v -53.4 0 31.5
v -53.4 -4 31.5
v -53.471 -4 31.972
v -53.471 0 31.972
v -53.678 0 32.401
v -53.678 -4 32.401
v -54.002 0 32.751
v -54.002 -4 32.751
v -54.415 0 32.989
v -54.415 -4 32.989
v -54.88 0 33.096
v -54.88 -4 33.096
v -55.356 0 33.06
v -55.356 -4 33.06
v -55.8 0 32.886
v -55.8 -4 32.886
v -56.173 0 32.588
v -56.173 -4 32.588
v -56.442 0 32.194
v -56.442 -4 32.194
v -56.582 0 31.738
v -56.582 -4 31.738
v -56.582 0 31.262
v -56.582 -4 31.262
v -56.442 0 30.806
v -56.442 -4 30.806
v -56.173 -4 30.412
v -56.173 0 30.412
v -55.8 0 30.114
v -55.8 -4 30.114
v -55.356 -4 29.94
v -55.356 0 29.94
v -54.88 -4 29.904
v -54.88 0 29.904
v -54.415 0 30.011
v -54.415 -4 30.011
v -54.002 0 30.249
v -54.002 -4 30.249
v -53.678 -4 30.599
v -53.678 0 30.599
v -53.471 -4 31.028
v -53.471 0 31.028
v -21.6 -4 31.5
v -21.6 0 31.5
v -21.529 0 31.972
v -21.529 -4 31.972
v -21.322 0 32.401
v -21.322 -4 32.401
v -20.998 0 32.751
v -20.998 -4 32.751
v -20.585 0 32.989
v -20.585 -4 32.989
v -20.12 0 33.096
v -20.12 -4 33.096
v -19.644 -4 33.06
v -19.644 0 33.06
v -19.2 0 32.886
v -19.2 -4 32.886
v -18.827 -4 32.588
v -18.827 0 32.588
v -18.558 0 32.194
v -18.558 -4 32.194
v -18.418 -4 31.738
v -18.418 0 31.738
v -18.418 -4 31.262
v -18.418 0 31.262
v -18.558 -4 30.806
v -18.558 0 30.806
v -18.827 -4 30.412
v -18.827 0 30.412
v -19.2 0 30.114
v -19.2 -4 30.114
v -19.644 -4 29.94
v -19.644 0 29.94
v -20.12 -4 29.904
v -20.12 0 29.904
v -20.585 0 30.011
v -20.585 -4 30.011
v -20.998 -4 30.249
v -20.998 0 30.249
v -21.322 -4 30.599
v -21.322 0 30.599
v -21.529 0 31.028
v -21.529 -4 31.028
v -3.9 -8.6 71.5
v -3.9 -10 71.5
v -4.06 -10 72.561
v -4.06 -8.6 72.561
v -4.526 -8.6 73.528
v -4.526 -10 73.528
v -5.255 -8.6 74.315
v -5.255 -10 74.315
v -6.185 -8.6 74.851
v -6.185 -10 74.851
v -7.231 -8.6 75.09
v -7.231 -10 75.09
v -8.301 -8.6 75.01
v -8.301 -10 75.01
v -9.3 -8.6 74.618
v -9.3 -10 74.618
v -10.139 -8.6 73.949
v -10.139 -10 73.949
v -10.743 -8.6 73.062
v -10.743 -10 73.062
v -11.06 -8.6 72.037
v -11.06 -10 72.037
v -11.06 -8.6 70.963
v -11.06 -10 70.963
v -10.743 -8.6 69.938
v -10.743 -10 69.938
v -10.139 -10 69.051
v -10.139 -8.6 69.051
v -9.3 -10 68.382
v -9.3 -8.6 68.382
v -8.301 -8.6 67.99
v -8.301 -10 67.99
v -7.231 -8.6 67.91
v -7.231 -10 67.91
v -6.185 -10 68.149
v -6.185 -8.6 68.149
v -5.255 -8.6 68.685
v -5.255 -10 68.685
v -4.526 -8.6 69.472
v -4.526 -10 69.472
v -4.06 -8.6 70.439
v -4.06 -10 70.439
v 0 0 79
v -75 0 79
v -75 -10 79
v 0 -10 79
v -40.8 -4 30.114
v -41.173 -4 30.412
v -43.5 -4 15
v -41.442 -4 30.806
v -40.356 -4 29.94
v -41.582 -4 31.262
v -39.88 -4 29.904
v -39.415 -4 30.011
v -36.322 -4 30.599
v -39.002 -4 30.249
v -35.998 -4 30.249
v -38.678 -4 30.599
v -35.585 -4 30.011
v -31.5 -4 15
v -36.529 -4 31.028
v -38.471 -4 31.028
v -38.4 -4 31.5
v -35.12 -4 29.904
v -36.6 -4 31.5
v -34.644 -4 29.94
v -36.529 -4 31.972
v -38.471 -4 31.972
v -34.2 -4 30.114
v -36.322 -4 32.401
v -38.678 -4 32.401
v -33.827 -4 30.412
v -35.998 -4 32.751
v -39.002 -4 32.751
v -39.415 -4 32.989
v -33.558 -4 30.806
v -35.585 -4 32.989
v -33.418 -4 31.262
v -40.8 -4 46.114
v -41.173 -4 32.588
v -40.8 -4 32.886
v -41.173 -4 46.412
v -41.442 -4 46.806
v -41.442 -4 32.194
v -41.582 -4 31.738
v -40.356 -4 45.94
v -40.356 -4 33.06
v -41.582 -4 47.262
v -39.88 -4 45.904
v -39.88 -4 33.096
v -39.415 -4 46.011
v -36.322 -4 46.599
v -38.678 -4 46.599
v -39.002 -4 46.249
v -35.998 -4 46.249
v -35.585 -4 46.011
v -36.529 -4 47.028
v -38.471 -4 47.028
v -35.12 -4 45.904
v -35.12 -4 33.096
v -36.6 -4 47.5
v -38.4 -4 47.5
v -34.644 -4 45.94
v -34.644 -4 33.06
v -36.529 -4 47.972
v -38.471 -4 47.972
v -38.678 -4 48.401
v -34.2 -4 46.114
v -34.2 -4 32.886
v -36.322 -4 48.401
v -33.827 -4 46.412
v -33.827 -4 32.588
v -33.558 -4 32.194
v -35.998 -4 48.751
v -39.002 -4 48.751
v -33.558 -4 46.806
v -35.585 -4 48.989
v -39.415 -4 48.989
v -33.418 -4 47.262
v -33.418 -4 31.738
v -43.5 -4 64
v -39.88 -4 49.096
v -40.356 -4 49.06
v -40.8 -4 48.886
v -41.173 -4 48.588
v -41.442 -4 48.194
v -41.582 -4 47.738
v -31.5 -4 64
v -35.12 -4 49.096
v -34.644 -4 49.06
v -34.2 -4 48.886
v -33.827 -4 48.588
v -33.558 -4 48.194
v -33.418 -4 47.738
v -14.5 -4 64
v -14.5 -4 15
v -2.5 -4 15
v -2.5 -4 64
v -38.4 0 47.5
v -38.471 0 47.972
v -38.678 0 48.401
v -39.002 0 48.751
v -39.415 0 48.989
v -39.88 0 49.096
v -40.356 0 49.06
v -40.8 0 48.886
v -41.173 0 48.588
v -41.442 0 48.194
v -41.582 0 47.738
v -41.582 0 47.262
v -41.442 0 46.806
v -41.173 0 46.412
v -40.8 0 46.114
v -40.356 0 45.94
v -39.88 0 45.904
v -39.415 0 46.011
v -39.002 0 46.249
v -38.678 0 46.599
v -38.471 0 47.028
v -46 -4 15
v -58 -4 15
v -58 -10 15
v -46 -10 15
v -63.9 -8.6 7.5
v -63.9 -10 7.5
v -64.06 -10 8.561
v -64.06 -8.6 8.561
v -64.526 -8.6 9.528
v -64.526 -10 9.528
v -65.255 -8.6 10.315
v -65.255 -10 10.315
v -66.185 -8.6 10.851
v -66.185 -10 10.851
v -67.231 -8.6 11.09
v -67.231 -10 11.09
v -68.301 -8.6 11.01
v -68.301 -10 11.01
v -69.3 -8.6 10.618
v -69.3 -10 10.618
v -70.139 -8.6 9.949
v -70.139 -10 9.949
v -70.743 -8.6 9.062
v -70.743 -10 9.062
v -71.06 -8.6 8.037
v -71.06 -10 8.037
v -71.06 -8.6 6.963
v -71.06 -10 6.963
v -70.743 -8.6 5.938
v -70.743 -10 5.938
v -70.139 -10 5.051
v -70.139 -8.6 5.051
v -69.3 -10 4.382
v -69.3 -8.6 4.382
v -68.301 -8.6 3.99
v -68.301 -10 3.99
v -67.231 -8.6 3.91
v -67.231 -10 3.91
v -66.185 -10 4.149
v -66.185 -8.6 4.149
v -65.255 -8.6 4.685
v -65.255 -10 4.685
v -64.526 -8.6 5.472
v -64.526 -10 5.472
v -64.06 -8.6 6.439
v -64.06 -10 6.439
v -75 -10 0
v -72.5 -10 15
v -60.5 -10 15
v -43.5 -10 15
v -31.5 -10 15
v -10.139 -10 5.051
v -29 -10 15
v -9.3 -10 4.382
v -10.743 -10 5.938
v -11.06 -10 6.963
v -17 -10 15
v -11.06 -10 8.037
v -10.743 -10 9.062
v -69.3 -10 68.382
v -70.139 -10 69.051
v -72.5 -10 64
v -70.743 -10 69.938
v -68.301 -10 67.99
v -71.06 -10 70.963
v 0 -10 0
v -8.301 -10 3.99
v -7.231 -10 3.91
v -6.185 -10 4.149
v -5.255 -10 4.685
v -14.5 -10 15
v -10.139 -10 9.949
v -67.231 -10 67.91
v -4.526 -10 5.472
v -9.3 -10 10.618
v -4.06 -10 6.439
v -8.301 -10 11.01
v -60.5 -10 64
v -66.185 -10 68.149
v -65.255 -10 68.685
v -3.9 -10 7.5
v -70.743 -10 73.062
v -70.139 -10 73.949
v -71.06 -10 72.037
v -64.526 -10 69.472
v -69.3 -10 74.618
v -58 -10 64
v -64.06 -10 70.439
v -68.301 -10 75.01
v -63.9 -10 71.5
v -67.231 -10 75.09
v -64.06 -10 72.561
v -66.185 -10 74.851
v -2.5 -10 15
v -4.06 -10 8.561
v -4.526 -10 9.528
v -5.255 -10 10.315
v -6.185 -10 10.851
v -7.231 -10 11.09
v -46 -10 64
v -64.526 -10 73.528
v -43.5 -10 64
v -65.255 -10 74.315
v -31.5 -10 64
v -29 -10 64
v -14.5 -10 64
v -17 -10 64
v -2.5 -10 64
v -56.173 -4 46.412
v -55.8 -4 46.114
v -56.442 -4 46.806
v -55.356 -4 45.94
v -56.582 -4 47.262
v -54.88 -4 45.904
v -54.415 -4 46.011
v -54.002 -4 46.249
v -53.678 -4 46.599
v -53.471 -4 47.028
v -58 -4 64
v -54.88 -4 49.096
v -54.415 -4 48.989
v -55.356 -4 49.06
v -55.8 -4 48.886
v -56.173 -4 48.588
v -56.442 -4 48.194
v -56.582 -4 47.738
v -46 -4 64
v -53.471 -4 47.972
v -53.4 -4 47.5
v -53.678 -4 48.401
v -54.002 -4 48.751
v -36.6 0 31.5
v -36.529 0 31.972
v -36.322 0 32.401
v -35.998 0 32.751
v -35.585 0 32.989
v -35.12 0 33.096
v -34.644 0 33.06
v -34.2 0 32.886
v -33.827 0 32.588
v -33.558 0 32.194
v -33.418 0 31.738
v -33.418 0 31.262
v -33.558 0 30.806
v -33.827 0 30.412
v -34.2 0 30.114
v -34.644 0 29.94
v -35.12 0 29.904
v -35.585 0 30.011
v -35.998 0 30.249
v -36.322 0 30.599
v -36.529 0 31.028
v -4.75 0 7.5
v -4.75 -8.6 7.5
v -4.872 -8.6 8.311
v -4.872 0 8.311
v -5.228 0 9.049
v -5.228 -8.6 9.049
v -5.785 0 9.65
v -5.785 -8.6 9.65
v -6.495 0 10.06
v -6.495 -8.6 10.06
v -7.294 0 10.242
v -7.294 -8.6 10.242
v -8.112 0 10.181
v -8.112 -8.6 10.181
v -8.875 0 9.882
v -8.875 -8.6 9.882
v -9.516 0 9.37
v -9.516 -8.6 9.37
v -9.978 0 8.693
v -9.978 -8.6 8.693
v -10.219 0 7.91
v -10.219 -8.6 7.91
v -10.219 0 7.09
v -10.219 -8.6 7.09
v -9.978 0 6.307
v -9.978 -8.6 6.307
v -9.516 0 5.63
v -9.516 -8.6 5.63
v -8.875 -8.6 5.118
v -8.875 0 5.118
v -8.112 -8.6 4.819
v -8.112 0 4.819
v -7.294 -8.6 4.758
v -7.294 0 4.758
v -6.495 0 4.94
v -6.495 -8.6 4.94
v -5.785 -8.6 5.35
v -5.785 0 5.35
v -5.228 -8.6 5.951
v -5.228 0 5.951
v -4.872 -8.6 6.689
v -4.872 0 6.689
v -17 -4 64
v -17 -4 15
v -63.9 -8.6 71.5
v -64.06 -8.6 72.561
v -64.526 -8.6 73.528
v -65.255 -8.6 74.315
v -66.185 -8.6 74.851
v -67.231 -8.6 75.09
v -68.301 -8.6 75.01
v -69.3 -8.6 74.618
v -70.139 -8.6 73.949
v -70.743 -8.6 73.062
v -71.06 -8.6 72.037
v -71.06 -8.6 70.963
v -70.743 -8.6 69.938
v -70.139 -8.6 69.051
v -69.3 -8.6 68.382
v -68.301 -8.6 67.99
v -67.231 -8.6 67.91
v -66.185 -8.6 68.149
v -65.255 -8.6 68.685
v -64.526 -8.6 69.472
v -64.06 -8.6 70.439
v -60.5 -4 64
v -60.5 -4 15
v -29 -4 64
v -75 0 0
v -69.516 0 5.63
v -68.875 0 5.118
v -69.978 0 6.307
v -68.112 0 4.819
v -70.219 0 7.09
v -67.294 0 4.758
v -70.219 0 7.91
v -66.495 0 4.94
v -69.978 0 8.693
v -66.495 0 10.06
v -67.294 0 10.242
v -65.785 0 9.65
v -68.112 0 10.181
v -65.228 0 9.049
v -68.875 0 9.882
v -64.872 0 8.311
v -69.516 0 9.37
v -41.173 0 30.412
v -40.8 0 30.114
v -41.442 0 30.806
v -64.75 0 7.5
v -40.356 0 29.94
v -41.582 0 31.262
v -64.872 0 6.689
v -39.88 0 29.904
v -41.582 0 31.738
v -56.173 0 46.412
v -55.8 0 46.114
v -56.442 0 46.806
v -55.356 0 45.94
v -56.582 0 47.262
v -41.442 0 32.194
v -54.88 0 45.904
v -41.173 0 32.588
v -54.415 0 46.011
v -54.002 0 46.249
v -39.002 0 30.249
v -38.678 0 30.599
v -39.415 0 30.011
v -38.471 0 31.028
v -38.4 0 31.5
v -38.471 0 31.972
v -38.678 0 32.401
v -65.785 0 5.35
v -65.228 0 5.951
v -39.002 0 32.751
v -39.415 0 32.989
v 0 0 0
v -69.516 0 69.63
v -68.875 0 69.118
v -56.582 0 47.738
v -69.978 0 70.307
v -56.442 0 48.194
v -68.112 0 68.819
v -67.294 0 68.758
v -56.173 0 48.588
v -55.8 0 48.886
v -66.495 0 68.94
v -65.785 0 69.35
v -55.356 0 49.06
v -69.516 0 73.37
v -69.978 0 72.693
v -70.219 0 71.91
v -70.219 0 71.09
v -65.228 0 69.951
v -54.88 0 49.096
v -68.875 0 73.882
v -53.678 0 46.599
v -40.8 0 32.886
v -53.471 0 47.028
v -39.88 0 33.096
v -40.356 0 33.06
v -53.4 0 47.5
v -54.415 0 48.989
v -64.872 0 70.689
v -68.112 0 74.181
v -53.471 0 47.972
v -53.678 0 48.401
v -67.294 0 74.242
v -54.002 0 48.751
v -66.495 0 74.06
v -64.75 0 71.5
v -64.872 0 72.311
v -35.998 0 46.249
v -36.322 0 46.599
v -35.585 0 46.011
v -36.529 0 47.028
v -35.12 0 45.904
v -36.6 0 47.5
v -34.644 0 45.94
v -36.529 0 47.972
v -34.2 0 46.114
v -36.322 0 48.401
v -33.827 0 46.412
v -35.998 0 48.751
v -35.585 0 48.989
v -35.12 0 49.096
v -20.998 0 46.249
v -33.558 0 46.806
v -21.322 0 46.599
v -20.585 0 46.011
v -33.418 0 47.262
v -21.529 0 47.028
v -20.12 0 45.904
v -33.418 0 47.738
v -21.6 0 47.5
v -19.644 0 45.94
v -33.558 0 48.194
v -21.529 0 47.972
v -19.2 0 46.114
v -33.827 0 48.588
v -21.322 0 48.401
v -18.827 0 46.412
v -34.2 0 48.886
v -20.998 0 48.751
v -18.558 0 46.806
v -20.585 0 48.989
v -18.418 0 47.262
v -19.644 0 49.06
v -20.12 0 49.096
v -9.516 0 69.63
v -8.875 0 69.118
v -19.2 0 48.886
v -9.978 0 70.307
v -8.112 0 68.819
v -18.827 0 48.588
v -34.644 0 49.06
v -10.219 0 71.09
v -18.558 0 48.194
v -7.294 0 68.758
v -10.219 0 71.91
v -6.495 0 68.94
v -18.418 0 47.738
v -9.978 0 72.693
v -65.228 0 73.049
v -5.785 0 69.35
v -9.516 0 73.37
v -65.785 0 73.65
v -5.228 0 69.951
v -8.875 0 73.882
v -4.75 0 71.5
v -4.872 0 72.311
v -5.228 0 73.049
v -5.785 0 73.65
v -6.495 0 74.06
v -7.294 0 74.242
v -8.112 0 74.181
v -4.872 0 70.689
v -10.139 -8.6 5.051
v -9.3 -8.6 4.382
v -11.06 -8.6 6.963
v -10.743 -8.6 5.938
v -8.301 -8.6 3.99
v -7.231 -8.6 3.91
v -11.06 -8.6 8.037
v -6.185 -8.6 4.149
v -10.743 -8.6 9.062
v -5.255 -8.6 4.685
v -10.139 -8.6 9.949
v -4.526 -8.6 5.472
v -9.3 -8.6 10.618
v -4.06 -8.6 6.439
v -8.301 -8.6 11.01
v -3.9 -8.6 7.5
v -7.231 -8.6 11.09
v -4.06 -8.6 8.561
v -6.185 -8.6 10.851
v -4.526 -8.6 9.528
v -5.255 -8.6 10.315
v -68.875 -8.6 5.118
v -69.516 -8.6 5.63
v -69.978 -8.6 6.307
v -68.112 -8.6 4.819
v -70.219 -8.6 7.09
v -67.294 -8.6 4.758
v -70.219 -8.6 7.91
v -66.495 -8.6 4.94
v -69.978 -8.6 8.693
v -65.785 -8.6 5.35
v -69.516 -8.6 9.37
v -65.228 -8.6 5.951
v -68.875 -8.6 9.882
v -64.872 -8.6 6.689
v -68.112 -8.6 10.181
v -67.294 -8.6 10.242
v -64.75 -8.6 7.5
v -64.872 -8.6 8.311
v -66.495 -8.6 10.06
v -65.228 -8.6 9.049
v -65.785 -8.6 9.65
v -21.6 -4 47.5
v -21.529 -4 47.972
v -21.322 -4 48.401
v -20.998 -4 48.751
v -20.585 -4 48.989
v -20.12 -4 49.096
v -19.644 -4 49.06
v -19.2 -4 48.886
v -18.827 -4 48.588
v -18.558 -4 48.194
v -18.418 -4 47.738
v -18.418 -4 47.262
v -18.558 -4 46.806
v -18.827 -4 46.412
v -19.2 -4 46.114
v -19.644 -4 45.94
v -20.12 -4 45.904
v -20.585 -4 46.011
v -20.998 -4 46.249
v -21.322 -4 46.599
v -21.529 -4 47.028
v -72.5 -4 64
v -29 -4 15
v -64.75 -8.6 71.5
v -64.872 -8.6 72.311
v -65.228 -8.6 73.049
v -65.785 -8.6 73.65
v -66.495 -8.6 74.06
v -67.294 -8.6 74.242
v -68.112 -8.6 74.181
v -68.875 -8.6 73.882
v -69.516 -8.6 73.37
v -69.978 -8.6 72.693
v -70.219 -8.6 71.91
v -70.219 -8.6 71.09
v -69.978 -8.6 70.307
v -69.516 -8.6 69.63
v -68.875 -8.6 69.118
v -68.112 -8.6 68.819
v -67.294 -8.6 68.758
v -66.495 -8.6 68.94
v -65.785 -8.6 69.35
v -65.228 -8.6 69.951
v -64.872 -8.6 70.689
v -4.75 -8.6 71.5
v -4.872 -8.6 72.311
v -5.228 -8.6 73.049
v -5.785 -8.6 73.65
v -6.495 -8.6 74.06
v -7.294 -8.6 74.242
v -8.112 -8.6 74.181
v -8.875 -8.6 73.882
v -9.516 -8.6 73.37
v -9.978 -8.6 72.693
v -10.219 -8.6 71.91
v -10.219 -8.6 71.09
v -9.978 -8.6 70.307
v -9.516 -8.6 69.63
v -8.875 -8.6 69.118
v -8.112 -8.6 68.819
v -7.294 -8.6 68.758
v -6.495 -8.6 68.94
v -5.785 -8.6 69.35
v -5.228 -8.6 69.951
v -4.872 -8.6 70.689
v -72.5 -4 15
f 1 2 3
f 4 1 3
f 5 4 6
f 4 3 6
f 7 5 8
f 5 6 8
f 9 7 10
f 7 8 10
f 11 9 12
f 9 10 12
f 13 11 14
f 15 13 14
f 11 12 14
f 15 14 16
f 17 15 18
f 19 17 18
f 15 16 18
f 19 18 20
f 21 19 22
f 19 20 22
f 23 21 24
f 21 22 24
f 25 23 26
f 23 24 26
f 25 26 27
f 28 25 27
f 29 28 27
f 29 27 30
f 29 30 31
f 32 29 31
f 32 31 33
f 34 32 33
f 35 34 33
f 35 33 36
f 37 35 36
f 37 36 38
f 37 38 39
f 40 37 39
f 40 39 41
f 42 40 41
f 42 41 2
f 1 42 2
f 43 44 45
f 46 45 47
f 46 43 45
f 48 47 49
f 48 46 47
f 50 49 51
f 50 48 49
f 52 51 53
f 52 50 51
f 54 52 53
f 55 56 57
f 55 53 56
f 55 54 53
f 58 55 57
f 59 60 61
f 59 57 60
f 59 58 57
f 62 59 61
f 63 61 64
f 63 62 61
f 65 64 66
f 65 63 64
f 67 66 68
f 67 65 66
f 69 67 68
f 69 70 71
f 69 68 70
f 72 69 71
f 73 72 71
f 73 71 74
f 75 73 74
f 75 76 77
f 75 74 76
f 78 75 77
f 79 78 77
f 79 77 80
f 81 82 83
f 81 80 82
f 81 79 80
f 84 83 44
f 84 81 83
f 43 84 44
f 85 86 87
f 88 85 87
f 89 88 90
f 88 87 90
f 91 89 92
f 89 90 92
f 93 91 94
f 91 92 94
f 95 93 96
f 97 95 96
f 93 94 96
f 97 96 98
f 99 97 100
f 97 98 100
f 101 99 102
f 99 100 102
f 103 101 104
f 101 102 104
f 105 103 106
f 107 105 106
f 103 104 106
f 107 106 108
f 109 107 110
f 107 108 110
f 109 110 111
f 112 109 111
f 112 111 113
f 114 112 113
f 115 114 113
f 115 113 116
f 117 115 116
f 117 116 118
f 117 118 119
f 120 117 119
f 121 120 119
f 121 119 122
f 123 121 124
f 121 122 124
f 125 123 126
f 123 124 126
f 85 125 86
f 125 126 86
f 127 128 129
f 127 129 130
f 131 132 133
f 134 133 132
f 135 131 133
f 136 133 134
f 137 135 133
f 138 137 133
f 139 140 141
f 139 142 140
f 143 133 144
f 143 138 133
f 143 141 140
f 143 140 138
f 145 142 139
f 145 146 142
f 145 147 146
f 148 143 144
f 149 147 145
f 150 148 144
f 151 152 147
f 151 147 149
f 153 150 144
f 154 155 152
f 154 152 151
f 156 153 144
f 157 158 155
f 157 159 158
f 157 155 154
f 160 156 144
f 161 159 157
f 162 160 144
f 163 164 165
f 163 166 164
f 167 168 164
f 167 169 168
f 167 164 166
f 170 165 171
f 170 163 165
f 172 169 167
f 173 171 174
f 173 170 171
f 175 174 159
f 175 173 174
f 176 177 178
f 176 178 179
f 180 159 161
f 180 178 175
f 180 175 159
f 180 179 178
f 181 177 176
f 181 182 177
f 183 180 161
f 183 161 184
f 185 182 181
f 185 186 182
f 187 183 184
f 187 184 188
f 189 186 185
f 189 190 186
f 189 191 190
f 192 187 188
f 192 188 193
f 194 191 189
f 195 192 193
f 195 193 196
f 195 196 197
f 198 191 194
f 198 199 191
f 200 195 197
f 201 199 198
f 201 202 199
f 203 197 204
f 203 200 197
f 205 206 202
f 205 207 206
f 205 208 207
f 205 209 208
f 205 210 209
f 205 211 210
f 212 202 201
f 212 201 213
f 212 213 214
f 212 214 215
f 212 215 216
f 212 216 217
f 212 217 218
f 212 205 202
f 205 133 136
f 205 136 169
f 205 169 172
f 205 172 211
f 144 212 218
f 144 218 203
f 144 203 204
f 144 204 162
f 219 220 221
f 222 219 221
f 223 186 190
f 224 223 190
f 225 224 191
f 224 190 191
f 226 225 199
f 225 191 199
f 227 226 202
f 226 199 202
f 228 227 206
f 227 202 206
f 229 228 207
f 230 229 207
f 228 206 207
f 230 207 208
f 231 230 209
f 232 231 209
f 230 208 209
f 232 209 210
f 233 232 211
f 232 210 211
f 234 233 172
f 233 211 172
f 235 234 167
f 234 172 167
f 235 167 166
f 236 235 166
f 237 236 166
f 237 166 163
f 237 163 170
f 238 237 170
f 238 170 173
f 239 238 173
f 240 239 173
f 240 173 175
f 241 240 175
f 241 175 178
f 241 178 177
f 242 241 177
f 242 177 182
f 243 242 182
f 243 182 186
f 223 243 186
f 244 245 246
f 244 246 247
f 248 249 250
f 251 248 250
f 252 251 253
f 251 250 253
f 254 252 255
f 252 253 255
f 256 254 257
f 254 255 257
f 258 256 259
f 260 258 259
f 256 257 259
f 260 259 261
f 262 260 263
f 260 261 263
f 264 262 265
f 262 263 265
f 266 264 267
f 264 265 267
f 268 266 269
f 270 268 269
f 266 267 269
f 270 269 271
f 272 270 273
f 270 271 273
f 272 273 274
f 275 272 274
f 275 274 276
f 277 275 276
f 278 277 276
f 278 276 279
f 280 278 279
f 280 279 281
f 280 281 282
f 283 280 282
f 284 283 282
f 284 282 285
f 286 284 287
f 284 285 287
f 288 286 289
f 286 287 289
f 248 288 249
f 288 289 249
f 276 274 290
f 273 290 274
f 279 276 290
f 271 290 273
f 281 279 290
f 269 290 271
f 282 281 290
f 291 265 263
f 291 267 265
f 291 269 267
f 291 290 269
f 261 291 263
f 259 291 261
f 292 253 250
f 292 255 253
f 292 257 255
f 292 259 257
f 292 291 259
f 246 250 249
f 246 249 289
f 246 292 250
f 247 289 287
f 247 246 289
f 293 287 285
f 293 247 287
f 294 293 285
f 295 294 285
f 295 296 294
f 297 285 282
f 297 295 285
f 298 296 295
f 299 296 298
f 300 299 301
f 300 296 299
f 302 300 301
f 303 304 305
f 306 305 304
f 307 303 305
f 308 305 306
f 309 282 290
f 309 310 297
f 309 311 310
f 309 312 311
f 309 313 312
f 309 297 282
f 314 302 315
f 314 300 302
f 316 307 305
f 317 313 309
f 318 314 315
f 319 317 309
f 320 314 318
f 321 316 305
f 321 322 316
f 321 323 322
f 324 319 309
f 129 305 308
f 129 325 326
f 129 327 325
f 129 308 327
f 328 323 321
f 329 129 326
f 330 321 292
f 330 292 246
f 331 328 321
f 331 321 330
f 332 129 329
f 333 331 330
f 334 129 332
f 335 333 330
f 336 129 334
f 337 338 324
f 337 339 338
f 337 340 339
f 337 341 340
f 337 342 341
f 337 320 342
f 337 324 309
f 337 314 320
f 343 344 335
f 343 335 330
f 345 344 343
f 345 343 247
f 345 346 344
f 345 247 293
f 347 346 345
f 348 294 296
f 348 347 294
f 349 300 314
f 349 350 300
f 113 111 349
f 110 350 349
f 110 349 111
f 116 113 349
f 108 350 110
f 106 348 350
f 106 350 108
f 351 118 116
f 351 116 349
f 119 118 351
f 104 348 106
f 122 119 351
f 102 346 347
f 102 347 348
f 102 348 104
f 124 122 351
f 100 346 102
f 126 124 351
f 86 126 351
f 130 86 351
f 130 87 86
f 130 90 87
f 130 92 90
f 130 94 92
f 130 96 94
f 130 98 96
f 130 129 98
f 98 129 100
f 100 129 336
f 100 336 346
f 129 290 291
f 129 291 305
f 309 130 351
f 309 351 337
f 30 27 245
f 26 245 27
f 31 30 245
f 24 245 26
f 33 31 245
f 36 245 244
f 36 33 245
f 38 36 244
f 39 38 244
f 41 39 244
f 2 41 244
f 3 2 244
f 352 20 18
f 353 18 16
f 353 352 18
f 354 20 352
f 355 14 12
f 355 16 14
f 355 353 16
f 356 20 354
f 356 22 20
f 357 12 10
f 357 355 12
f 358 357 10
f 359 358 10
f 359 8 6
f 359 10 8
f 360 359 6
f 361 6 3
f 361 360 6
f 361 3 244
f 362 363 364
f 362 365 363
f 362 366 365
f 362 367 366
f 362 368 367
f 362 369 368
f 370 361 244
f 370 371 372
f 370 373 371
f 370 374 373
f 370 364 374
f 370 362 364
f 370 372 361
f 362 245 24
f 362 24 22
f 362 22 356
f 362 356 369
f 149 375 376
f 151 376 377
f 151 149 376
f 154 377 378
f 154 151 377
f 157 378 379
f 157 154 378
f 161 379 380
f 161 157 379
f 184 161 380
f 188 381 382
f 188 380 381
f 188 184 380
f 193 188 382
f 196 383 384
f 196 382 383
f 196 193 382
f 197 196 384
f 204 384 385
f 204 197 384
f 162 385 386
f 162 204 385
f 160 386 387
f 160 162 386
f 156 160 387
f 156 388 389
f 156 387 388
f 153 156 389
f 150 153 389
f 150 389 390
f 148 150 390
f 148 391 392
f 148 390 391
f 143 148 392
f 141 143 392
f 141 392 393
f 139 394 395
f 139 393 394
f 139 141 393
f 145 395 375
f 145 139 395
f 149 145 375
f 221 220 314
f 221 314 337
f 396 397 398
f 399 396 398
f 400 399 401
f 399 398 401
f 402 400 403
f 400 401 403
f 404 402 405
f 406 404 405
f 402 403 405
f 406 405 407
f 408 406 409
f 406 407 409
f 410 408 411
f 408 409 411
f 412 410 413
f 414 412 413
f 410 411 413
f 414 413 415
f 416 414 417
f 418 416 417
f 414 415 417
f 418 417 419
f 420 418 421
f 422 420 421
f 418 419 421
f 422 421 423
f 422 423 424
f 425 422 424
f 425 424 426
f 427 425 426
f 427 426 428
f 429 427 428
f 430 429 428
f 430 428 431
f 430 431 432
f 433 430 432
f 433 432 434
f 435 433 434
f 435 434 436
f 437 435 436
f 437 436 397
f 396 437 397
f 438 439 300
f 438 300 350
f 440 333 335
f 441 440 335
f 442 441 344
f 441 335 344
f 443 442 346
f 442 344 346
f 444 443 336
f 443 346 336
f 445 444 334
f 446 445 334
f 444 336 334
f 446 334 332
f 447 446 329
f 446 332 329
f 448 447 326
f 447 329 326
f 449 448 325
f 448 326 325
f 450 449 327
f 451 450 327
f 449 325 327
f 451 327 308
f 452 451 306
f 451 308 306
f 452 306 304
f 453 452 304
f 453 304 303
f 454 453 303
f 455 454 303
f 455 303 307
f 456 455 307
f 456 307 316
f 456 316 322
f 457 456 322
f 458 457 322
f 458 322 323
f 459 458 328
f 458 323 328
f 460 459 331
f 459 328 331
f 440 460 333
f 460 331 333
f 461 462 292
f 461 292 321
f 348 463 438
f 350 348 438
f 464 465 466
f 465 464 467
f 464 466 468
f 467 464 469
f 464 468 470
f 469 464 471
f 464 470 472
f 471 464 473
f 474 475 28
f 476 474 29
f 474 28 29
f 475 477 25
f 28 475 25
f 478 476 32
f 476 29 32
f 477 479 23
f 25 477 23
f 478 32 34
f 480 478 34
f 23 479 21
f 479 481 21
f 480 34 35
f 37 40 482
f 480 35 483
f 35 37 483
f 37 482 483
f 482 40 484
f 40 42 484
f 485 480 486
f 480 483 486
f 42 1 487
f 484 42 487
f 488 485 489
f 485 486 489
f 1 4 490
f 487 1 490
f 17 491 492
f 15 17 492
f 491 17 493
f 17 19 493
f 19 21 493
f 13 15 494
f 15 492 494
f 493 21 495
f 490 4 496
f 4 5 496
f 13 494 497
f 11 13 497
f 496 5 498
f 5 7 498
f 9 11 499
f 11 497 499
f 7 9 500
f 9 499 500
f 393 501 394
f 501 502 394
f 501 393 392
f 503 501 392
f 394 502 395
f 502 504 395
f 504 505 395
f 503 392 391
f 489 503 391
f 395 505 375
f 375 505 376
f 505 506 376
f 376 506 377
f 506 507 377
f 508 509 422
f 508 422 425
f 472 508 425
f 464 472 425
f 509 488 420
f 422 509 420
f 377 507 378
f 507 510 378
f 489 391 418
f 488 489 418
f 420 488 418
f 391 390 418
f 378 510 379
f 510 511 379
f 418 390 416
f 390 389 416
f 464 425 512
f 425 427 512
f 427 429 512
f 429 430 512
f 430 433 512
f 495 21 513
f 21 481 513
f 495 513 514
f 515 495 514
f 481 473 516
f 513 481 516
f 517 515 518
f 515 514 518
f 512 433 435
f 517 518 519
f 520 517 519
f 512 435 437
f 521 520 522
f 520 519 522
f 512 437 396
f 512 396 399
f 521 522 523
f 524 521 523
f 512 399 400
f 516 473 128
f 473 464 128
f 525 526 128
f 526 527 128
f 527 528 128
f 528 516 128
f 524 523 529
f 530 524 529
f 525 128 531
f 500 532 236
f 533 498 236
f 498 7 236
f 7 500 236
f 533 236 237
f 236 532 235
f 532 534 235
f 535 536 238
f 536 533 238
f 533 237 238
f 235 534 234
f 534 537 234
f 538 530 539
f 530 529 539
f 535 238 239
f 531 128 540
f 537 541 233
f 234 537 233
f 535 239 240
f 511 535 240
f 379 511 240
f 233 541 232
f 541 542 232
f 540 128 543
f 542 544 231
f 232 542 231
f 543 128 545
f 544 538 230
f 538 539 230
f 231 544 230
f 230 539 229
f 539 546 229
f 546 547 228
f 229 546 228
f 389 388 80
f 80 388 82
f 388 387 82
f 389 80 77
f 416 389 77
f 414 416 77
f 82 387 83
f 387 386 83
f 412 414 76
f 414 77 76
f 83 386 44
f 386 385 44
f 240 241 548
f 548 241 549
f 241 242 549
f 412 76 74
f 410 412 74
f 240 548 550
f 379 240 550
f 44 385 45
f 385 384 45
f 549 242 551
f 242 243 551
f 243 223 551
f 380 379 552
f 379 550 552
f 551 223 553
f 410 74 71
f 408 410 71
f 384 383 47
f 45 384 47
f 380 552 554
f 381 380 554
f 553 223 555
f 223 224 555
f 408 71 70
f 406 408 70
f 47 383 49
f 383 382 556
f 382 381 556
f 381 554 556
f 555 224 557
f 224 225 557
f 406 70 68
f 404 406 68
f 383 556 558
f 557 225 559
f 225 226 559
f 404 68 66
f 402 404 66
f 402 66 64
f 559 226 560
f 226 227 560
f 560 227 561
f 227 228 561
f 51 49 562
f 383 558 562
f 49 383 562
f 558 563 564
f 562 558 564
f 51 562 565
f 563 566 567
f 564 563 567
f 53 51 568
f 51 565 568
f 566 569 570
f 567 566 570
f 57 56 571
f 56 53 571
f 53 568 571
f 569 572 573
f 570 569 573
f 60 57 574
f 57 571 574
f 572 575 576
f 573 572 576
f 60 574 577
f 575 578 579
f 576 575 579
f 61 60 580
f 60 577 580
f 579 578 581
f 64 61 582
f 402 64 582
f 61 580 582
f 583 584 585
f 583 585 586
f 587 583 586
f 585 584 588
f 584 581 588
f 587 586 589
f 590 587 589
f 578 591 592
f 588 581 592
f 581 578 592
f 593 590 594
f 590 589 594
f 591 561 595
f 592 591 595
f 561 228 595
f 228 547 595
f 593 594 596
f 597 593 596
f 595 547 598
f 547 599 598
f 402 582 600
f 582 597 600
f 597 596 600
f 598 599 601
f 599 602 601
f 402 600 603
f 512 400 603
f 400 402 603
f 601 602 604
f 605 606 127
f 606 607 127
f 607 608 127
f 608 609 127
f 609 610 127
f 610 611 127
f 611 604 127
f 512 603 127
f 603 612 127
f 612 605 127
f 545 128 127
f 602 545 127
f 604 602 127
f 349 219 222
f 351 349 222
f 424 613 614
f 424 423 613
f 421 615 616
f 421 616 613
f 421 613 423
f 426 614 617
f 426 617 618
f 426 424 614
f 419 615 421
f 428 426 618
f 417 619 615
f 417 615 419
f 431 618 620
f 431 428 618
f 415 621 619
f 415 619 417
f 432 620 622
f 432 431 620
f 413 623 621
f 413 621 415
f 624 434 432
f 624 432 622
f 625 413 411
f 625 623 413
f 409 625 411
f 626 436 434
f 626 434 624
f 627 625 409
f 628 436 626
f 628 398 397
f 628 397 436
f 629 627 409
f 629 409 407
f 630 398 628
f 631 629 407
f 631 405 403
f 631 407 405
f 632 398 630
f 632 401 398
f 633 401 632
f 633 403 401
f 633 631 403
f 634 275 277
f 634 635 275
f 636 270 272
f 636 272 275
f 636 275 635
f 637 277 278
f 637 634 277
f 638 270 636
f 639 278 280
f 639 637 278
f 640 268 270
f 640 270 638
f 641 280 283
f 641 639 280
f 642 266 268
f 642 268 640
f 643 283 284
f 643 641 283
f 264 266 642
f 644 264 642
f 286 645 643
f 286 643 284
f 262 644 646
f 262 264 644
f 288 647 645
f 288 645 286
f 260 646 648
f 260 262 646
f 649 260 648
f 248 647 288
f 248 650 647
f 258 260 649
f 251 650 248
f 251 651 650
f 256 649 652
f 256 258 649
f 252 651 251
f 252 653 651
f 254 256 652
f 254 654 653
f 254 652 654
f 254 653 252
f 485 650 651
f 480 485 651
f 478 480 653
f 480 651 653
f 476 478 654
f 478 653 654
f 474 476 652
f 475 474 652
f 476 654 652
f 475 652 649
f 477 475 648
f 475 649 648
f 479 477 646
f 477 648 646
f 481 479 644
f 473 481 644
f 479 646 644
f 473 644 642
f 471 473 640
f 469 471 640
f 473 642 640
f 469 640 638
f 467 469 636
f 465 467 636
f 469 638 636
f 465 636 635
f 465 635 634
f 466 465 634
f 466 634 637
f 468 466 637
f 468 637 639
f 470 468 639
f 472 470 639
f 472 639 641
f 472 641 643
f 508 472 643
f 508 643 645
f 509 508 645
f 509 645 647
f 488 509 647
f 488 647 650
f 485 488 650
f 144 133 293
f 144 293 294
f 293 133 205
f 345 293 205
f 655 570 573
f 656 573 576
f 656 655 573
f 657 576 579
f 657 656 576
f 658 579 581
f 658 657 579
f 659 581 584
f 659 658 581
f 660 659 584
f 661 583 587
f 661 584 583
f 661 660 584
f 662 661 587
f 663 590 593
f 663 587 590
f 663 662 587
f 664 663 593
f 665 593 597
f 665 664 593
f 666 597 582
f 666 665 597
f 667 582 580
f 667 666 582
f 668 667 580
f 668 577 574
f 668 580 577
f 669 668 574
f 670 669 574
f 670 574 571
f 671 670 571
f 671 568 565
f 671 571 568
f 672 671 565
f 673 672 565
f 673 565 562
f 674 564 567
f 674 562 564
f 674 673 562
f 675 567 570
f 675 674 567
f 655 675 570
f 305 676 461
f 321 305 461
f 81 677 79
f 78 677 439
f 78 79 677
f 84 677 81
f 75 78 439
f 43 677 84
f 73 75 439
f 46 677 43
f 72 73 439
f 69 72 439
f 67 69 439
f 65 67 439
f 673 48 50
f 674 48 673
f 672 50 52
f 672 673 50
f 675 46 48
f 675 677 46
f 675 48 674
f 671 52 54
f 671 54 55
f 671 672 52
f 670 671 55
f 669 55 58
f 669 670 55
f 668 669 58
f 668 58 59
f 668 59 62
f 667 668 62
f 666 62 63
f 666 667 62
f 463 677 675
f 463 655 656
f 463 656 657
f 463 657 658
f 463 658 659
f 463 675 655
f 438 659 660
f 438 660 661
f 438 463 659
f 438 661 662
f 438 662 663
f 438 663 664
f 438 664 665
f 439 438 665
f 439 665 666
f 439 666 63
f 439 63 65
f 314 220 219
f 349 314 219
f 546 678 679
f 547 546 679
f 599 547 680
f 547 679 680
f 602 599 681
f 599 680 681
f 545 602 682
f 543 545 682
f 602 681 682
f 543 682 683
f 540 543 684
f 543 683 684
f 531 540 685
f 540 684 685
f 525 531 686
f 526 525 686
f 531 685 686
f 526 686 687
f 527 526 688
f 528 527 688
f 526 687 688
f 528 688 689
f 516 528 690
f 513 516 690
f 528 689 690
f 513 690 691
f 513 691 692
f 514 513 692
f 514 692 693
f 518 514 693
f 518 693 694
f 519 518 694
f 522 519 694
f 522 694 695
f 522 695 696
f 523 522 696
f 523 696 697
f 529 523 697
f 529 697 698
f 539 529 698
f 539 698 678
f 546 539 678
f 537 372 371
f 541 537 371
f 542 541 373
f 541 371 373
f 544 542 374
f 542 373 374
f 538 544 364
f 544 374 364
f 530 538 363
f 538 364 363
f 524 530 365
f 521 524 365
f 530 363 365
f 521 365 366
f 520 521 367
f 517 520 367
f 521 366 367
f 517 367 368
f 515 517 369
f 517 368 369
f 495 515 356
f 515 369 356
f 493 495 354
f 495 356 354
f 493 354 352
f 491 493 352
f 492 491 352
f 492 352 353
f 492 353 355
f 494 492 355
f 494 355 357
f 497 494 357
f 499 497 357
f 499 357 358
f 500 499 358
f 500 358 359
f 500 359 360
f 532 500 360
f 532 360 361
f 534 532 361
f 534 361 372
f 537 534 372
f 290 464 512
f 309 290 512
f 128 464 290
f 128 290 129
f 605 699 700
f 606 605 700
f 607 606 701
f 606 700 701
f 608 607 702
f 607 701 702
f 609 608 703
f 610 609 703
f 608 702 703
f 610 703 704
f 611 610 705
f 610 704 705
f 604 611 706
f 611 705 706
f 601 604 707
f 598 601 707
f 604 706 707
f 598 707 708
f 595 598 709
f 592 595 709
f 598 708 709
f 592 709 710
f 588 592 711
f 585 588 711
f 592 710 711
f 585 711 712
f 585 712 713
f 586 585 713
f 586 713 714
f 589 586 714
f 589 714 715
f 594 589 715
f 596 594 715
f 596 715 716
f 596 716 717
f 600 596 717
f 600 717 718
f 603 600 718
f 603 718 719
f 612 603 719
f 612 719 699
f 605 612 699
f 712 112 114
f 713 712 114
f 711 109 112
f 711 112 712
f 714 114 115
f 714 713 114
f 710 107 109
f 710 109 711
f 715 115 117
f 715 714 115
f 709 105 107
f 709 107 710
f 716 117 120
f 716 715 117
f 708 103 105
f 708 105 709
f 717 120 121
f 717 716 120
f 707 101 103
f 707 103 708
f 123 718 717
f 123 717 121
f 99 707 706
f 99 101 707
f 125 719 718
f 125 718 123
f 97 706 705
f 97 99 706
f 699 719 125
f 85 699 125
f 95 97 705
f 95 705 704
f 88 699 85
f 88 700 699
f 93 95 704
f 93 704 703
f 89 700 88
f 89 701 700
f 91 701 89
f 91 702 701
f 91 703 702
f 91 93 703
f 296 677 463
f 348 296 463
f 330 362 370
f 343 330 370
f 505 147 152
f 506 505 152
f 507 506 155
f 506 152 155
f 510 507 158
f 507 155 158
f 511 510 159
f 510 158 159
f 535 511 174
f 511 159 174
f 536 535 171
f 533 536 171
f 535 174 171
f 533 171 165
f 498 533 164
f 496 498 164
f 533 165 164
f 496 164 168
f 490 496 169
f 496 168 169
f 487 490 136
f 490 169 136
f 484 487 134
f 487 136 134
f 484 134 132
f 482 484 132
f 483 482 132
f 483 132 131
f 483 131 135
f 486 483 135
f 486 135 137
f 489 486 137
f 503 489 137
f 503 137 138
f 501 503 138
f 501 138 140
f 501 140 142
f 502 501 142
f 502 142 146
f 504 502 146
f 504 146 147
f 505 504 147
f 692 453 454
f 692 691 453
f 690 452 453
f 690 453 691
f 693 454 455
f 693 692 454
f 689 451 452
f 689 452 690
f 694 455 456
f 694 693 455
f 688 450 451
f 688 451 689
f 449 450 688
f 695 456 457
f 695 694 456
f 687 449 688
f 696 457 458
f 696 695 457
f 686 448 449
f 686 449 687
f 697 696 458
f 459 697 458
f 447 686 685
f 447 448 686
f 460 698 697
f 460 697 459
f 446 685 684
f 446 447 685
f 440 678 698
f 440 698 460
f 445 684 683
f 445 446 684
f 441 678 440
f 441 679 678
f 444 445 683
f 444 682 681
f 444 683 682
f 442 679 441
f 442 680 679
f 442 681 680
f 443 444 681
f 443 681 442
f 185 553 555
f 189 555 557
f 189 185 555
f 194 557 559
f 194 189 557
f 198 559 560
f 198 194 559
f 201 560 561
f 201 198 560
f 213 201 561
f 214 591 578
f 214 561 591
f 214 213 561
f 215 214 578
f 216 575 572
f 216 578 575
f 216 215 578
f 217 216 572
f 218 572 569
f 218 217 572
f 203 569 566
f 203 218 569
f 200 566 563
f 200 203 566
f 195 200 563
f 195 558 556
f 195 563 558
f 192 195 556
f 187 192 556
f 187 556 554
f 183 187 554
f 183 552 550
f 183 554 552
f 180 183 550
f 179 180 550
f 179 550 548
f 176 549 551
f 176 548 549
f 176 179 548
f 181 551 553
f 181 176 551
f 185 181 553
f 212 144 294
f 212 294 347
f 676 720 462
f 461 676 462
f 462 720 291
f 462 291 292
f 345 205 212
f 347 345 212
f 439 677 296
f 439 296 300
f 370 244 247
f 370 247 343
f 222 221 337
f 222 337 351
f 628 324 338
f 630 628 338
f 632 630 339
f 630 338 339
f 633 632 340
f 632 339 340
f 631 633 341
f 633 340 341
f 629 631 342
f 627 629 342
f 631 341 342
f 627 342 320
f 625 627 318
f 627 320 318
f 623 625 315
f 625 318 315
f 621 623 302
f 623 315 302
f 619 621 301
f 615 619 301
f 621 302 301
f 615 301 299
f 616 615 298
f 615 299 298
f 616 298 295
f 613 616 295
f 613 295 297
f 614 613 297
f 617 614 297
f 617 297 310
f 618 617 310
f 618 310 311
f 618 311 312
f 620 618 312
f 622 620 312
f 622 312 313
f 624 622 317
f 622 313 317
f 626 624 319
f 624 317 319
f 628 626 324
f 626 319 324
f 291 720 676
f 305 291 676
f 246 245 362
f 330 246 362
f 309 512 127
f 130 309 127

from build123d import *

# Parameters (mm, degrees)
SKETCH008_W         = 75
SKETCH008_H         = 79
PAD003_DEPTH        = 4
SKETCH009_W         = 75
SKETCH009_H         = 15
PAD004_DEPTH        = 6
SKETCH010_R         = 1.6
POCKET005_DEPTH     = 222.779427
SKETCH011_R         = 2.75
POCKET006_DEPTH     = 10.001
SKETCH012_W         = 2.5
SKETCH012_H         = 49
PAD005_DEPTH        = 6
LINEARPATTERN_COUNT = 6
LINEARPATTERN_PITCH = 14.5
SKETCH015_R         = 3.6
POCKET008_DEPTH     = 1.4


with BuildPart() as part:
    # Sketch008 → Pad003 (new body)
    with BuildSketch(Plane.XZ):
        with Locations((-37.5, 39.5)):
            Rectangle(SKETCH008_W, SKETCH008_H)
    extrude(amount=PAD003_DEPTH)

    # Sketch009 (on Face6 of Pad003) → Pad004 (join)
    with BuildSketch(Plane.XZ.offset(4)):
        with Locations((-37.5, 71.5)):
            Rectangle(SKETCH009_W, SKETCH009_H)
        with Locations((-37.5, 7.5)):
            Rectangle(SKETCH009_W, SKETCH009_H)
    extrude(amount=PAD004_DEPTH)

    # Sketch010 (on Face8 of Pad004) → Pocket005 (cut, through all)
    with BuildSketch(Plane.XZ.offset(4)):
        with Locations((-55, 47.5)):
            Circle(SKETCH010_R)
        with Locations((-40, 47.5)):
            Circle(SKETCH010_R)
        with Locations((-40, 31.5)):
            Circle(SKETCH010_R)
        with Locations((-55, 31.5)):
            Circle(SKETCH010_R)
    pocket005 = extrude(amount=-POCKET005_DEPTH, mode=Mode.SUBTRACT)

    # Mirrored: Pocket005 across Sketch010 Axis12
    add(pocket005.mirror(Plane(origin=(-37.5, -4, 64), x_dir=(0, -1, 0), z_dir=(1, 0, 0))), mode=Mode.SUBTRACT)

    # Sketch011 (on Face23 of Mirrored) → Pocket006 (cut, through all)
    with BuildSketch(Plane.XZ.offset(10)):
        with Locations((-67.5, 71.5)):
            Circle(SKETCH011_R)
        with Locations((-7.5, 71.5)):
            Circle(SKETCH011_R)
        with Locations((-7.5, 7.5)):
            Circle(SKETCH011_R)
        with Locations((-67.5, 7.5)):
            Circle(SKETCH011_R)
    extrude(amount=-POCKET006_DEPTH, mode=Mode.SUBTRACT)

    # Sketch012 (on Face8 of Pocket006) → Pad005 (join)
    with BuildSketch(Plane.XZ.offset(4)):
        with Locations((-73.75, 39.5)):
            Rectangle(SKETCH012_W, SKETCH012_H)
    pad005 = extrude(amount=PAD005_DEPTH)

    # LinearPattern: Pad005 ×6
    with Locations(*[(i * LINEARPATTERN_PITCH, 0, 0) for i in range(1, LINEARPATTERN_COUNT)]):
        add(pad005)

    # Sketch015 (on Face25 of LinearPattern) → Pocket008 (cut)
    with BuildSketch(Plane.XZ.offset(10)):
        with Locations((-67.5, 71.5)):
            Circle(SKETCH015_R)
        with Locations((-7.5, 71.5)):
            Circle(SKETCH015_R)
        with Locations((-7.5, 7.5)):
            Circle(SKETCH015_R)
        with Locations((-67.5, 7.5)):
            Circle(SKETCH015_R)
    extrude(amount=-POCKET008_DEPTH, mode=Mode.SUBTRACT)


solid = part.part
